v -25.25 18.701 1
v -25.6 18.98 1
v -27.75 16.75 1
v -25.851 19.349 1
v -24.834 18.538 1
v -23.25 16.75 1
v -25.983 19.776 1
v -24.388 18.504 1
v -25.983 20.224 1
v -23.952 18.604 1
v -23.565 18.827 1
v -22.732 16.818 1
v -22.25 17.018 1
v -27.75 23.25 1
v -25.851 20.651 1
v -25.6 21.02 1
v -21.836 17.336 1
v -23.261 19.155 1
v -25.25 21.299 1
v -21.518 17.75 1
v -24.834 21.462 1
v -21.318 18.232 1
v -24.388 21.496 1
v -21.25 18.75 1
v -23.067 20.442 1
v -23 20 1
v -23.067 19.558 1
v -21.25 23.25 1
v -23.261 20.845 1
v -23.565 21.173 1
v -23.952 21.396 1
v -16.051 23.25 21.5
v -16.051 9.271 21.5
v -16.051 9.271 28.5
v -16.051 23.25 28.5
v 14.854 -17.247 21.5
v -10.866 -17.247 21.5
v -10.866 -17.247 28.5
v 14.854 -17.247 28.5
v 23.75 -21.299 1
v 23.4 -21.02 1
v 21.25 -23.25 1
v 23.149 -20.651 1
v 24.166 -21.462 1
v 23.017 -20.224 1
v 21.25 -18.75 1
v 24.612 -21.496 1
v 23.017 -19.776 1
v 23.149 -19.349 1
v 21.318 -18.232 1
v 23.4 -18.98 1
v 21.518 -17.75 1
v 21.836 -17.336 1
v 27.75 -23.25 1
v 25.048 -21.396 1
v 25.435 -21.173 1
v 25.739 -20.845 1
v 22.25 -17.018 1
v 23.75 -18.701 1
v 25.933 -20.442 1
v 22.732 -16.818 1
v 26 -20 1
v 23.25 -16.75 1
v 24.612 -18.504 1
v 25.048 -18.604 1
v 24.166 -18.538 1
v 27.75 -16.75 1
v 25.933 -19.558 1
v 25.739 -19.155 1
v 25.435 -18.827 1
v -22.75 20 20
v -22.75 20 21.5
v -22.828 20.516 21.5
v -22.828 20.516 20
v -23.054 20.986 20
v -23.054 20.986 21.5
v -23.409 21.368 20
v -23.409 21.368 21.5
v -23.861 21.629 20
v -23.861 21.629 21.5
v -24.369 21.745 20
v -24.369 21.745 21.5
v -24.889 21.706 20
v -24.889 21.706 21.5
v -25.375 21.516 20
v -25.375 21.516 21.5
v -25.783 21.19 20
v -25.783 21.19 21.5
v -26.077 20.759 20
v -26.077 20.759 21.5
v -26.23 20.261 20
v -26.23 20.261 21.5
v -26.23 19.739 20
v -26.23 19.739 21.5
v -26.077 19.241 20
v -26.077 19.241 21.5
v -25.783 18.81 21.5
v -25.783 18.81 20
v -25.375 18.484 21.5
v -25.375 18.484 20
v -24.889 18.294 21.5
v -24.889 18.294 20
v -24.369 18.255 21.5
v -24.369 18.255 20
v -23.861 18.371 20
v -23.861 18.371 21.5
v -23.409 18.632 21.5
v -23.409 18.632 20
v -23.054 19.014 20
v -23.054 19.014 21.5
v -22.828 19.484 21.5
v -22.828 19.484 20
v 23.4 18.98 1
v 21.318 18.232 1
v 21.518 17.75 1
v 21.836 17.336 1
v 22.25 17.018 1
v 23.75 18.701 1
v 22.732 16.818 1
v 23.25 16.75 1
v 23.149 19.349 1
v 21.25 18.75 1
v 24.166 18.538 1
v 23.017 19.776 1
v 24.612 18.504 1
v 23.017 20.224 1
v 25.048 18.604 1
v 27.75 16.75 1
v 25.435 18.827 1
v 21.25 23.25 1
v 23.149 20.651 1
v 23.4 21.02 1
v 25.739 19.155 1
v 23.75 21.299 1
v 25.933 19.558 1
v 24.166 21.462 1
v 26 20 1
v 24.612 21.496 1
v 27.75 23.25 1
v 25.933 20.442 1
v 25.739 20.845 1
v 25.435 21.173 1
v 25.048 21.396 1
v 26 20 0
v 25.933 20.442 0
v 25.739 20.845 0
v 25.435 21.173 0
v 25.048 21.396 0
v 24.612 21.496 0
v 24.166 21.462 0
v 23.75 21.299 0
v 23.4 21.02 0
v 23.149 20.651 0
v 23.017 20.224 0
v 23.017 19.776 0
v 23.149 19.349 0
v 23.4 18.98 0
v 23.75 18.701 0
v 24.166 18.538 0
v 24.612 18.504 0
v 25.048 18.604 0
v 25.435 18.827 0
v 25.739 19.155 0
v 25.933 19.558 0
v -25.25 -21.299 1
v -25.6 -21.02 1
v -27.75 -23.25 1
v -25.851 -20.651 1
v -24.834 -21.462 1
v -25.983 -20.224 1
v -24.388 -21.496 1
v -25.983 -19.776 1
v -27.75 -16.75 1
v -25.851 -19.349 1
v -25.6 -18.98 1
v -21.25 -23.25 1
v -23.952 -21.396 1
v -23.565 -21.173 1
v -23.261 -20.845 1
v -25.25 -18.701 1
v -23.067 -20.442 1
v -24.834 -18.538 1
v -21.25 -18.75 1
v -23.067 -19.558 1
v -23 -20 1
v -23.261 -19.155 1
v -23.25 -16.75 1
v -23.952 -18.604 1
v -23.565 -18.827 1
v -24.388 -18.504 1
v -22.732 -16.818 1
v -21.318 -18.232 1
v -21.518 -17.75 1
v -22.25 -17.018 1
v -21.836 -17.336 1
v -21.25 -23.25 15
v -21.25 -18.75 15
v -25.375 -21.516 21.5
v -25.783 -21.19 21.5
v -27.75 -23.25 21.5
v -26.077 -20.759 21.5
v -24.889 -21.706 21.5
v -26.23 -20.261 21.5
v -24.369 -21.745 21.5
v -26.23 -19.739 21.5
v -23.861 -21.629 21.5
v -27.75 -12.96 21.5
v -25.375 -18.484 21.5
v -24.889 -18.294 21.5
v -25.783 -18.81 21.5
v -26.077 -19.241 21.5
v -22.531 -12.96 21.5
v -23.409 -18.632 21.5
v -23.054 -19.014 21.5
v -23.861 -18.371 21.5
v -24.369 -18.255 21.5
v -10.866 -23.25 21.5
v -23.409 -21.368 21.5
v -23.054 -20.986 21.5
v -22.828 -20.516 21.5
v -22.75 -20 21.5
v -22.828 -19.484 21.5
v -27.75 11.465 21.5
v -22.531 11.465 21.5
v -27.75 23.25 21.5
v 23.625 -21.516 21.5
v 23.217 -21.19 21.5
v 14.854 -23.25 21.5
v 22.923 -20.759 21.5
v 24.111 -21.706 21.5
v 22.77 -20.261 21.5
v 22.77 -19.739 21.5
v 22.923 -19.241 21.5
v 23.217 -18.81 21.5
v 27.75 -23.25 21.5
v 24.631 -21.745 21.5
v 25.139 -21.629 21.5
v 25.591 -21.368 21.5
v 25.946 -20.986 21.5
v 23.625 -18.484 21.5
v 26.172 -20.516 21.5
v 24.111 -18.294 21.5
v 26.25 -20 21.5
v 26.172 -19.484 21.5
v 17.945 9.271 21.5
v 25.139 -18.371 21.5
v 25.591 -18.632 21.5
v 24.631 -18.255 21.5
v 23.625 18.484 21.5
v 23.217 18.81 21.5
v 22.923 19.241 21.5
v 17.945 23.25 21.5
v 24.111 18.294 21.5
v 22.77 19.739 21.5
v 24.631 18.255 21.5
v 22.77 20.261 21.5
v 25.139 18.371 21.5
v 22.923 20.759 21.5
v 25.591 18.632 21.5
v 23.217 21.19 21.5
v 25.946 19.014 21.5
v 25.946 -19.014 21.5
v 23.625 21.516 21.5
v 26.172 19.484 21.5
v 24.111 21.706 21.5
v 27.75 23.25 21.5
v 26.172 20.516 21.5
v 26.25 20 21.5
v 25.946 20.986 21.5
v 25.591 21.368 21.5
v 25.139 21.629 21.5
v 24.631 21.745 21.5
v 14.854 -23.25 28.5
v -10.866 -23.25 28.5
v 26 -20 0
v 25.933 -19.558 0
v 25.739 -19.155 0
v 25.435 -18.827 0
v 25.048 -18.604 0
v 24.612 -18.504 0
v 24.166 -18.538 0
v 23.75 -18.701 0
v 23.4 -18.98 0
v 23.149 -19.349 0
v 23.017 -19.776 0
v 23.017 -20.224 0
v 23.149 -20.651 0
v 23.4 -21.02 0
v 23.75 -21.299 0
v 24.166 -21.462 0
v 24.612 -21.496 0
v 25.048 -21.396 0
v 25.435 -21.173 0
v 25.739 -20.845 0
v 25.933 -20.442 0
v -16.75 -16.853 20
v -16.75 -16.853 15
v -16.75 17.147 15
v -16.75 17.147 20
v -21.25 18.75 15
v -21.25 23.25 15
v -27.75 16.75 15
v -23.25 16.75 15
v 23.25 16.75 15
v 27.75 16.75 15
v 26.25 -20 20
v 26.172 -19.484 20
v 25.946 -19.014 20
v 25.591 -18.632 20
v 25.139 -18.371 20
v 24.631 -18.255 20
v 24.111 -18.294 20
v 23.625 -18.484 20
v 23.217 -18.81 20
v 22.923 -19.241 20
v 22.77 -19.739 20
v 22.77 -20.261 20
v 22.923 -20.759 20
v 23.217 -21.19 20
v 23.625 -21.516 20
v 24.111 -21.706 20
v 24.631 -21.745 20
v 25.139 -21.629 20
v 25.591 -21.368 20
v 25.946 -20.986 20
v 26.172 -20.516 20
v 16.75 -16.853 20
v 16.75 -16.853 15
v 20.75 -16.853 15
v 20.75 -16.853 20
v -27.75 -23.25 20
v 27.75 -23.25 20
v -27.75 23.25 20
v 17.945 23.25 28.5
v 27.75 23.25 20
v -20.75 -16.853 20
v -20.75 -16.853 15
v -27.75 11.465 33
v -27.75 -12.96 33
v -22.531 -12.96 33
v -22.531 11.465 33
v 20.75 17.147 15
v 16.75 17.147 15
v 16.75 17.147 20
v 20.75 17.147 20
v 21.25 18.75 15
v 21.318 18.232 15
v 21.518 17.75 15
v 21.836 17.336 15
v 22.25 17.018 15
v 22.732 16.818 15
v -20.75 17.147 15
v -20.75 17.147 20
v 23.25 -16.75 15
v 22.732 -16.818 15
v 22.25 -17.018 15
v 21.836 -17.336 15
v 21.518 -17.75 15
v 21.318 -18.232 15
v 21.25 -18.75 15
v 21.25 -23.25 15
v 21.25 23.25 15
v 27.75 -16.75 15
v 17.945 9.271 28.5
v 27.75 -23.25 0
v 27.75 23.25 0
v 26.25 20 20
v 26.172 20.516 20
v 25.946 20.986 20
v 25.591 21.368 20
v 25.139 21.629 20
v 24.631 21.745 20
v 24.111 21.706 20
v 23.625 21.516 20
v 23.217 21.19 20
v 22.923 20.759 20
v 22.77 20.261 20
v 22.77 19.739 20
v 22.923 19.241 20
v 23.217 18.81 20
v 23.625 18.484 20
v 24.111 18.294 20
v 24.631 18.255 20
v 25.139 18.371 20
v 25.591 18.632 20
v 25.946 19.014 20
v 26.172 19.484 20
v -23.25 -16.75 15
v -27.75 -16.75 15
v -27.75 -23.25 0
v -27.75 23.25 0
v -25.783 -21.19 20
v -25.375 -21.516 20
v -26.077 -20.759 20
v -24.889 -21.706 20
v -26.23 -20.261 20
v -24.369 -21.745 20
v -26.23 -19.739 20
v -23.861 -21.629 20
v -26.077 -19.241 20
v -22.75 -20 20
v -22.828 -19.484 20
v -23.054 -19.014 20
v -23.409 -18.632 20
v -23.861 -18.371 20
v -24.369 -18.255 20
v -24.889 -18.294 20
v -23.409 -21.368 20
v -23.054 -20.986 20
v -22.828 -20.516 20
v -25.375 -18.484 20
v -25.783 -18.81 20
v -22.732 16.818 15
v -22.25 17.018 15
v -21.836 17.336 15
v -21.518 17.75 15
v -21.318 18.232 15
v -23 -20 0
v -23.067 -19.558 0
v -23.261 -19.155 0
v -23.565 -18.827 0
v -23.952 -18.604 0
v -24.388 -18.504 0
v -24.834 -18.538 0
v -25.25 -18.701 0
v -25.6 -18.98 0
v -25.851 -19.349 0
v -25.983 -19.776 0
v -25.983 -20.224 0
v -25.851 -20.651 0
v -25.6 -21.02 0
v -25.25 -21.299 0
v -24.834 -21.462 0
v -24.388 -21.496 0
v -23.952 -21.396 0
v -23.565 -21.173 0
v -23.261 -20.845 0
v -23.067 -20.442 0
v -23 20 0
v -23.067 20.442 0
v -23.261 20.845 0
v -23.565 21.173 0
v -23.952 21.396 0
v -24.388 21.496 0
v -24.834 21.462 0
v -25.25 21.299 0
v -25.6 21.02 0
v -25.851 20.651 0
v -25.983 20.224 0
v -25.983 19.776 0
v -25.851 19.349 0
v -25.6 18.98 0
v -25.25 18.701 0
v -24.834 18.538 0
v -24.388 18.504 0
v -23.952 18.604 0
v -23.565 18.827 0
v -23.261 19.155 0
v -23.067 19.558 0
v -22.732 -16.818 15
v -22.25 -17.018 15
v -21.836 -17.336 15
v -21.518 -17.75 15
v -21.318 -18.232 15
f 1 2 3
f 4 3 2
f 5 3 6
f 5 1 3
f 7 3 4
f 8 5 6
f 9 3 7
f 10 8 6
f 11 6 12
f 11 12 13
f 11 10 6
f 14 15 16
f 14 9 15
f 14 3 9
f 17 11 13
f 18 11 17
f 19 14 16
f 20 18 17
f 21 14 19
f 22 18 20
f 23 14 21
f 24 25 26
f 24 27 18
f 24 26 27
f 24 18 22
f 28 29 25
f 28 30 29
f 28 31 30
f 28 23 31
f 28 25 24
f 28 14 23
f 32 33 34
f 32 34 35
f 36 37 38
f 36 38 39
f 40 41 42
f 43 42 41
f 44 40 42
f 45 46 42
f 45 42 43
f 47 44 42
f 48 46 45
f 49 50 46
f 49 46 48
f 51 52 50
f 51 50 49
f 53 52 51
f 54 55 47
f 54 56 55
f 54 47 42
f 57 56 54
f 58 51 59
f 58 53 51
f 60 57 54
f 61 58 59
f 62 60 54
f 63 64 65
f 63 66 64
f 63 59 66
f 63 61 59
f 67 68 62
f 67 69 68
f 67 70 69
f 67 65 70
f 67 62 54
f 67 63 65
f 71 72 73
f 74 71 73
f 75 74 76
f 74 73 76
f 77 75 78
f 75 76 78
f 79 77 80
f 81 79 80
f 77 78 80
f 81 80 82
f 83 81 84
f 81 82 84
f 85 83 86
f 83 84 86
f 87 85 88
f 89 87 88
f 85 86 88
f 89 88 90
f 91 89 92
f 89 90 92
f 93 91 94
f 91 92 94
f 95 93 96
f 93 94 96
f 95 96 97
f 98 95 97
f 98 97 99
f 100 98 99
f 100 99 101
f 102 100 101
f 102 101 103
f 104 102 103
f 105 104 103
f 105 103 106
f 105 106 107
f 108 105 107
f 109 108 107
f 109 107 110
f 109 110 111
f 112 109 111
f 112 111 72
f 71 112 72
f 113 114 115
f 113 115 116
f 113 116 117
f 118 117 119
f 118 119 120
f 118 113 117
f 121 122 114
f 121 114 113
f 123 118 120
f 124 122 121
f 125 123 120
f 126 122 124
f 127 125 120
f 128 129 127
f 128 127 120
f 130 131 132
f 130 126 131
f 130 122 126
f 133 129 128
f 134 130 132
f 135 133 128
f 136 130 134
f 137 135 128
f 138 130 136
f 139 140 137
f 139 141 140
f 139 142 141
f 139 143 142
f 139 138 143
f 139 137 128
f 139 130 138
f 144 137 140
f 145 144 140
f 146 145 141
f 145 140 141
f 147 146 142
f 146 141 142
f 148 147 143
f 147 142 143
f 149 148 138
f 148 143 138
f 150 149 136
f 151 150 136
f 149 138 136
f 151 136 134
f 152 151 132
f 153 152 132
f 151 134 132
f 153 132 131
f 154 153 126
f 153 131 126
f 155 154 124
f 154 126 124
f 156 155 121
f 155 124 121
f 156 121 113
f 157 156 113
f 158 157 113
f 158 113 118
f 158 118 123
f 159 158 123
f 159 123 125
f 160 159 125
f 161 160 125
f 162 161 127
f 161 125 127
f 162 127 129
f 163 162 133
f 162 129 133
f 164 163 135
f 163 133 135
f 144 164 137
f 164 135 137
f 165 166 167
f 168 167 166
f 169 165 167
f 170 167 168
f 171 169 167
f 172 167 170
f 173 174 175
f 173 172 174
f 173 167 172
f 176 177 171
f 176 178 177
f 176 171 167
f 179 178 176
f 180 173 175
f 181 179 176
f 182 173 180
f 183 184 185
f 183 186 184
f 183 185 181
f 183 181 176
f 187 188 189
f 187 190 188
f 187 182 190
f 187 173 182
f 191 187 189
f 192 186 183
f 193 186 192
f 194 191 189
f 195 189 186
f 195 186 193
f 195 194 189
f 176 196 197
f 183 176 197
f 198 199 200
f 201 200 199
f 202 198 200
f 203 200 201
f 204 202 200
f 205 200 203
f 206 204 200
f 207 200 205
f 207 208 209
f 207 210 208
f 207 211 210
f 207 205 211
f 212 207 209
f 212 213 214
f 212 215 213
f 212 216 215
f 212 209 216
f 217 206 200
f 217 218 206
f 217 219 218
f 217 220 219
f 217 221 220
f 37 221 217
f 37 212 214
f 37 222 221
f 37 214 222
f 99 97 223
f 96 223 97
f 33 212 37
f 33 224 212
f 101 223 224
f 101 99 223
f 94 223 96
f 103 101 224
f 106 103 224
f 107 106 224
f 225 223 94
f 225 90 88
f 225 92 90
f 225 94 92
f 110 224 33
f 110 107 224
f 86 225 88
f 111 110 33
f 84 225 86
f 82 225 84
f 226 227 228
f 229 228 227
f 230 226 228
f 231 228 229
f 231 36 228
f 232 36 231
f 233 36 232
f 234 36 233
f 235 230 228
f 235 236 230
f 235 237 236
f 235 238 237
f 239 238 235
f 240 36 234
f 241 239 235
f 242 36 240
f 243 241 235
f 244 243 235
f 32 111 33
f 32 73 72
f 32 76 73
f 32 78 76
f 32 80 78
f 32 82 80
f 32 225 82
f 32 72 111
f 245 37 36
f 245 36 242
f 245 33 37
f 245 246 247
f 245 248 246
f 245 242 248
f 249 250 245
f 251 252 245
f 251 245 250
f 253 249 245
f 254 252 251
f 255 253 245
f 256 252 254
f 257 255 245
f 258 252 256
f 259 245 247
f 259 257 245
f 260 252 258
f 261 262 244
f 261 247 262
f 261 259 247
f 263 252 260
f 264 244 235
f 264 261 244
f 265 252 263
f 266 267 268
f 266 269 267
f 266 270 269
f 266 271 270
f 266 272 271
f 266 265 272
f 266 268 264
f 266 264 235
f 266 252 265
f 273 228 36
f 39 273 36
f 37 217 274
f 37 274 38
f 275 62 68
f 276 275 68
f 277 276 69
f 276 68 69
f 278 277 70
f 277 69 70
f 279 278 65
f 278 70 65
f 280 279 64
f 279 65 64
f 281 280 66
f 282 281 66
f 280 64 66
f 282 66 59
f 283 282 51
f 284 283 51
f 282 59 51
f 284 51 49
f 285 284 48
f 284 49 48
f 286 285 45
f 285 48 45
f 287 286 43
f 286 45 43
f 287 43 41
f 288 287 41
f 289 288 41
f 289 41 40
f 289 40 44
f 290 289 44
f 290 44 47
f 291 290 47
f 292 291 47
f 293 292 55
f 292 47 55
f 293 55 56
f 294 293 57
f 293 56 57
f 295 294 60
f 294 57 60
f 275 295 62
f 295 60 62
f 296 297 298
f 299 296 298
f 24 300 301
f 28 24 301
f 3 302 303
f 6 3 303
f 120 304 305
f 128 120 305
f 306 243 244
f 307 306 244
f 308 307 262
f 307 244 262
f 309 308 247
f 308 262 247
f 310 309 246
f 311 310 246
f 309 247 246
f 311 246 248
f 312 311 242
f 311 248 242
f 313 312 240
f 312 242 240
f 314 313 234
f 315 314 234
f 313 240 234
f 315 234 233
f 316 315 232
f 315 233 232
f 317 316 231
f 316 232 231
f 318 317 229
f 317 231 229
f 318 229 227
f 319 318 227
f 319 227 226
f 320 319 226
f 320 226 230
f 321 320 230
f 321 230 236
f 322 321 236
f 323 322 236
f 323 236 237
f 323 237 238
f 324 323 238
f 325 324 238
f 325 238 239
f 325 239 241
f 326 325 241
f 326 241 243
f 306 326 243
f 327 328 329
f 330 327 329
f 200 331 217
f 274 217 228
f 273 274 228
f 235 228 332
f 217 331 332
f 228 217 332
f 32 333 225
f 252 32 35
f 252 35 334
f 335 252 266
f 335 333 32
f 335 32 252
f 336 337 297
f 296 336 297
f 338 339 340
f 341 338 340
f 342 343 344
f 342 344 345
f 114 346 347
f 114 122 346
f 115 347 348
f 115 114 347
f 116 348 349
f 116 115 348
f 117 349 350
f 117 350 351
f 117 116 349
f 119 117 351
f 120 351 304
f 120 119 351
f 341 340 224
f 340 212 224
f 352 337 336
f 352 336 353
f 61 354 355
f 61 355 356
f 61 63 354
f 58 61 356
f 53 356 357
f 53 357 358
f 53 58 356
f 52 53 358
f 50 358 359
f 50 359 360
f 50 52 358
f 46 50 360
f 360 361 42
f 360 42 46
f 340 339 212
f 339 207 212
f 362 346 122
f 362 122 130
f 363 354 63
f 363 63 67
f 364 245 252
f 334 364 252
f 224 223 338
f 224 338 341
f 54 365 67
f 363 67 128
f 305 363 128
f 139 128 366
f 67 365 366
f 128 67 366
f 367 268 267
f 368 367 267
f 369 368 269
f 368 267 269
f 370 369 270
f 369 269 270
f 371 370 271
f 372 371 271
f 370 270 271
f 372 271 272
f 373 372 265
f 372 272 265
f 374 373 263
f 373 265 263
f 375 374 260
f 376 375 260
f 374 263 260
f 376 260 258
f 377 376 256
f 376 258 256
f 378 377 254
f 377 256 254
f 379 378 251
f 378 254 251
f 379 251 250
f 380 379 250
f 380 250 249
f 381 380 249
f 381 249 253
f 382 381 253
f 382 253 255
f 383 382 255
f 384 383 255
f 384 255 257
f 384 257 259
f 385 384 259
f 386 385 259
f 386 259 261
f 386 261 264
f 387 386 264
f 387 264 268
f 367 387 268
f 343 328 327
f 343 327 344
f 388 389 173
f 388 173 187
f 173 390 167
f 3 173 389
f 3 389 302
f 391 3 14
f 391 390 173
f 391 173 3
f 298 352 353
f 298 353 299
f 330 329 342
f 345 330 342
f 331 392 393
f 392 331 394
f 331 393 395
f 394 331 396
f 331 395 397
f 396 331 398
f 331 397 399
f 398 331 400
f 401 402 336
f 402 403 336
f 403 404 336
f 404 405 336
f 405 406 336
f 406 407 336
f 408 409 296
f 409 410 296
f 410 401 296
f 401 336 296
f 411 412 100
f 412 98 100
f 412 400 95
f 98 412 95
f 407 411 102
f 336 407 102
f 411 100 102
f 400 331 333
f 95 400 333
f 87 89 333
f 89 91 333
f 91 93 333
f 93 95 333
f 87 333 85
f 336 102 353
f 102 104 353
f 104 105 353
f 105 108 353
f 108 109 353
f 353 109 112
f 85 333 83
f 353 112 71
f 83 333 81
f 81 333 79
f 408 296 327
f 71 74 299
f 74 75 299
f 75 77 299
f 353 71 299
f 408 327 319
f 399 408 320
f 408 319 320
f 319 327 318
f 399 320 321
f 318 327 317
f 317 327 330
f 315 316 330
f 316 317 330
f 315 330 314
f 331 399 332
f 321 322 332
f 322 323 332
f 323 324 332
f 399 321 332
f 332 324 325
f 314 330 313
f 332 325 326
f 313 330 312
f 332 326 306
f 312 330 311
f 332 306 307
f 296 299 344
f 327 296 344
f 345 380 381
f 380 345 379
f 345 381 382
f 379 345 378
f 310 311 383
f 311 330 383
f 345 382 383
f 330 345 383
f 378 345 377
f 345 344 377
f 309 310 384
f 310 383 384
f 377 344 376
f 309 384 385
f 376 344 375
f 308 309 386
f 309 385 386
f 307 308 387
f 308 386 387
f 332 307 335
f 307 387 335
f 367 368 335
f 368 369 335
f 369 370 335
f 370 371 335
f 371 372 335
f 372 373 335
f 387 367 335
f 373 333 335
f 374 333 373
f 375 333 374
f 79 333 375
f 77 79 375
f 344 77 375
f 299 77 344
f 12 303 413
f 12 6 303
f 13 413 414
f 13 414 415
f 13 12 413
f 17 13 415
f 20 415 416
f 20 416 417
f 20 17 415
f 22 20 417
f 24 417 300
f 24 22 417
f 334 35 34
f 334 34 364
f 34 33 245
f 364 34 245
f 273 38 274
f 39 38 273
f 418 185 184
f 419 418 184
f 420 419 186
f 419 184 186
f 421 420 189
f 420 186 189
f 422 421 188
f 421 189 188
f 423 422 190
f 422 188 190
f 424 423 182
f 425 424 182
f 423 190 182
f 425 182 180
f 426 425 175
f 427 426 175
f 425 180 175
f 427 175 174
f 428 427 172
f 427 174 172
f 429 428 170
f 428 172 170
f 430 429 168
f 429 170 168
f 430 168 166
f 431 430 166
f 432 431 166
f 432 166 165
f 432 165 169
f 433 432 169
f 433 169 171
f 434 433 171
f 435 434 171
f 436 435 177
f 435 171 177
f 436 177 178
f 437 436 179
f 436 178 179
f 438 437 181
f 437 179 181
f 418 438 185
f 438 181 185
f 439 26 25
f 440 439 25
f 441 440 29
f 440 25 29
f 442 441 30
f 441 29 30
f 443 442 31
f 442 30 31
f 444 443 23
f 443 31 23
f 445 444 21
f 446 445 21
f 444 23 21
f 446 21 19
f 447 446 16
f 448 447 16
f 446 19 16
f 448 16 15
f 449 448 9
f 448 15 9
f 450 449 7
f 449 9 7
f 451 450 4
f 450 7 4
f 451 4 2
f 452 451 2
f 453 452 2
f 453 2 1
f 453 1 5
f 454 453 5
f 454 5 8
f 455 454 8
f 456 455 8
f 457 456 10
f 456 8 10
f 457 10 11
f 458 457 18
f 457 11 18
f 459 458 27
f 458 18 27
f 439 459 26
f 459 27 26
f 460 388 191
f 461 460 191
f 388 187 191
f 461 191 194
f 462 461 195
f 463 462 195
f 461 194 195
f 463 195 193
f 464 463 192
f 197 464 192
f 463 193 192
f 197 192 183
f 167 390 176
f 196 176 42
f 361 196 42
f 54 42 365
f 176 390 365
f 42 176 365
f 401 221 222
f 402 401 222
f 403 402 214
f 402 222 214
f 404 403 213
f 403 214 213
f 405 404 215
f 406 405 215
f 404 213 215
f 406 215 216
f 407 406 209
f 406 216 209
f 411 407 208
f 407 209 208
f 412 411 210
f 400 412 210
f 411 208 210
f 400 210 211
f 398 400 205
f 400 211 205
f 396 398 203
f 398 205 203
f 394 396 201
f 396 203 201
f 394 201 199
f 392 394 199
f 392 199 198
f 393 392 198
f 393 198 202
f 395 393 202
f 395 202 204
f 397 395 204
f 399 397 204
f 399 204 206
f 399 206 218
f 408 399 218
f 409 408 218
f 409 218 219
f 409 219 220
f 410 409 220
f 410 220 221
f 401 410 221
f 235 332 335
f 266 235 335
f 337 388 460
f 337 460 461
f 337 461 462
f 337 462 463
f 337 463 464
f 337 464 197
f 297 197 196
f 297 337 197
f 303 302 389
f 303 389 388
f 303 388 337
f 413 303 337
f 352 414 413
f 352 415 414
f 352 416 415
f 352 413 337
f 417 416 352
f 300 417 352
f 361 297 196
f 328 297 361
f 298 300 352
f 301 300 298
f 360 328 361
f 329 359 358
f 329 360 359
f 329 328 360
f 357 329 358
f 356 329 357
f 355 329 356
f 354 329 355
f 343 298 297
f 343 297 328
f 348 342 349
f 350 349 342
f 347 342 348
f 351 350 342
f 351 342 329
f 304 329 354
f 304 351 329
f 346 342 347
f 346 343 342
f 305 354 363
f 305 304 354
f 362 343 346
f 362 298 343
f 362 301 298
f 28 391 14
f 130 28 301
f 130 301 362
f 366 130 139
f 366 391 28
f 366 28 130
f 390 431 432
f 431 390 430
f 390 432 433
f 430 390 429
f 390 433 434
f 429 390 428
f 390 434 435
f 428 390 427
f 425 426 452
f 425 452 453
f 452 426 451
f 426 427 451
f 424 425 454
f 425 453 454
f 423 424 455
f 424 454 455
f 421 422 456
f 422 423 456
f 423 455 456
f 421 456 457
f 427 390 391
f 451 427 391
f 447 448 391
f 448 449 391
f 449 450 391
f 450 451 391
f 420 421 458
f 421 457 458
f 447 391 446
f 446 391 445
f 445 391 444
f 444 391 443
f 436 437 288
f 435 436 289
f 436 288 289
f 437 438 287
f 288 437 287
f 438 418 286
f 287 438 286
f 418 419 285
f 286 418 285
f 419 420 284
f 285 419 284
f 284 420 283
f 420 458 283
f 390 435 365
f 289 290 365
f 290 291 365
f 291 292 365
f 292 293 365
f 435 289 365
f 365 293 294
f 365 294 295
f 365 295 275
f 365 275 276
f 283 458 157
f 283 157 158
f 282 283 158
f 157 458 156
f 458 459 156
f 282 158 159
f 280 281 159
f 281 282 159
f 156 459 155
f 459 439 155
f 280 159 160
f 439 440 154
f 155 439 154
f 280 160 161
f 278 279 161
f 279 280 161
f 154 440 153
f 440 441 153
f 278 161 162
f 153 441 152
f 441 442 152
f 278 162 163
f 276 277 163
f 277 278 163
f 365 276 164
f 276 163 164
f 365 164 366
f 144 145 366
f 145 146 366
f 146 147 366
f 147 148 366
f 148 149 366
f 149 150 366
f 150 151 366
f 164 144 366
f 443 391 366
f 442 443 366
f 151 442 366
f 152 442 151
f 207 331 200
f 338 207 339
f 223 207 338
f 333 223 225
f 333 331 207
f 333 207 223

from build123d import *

# Parameters (mm, degrees)
SKETCH_1_W          = 55.5
SKETCH_1_H          = 46.5
EXTRUDE_1_DEPTH     = 15
SKETCH_2_W          = 6.5
SKETCH_2_H          = 6.5
CUT_EXTRUDE_1_DEPTH = 14
FILLET_1_R          = 2
SKETCH_3_W          = 4
SKETCH_3_H          = 34
EXTRUDE_2_DEPTH     = 5
SKETCH_4_W          = 55.5
SKETCH_4_H          = 46.5
EXTRUDE_3_DEPTH     = 1.5
SKETCH_5_R          = 1.5
CUT_EXTRUDE_2_DEPTH = 1
SKETCH_6_R          = 1.75
CUT_EXTRUDE_3_DEPTH = 2
SKETCH_7_W          = 33.995169083
SKETCH_7_H          = 13.97859025
SKETCH_7_W_2        = 5.219477383
SKETCH_7_H_2        = 24.424681599
SKETCH_7_W_3        = 25.720685112
SKETCH_7_H_3        = 6.003184014
EXTRUDE_4_DEPTH     = 10
SKETCH_8_W          = 33.995169083
SKETCH_8_H          = 13.97859025
SKETCH_8_W_2        = 25.720685112
SKETCH_8_H_2        = 6.003184014
CUT_EXTRUDE_4_DEPTH = 3
SKETCH_10_W         = 5.219477383
SKETCH_10_H         = 24.424681599
EXTRUDE_6_DEPTH     = 1.5


with BuildPart() as part:
    # 草图1 → 凸台-拉伸1 (new body)
    with BuildSketch(Plane.XY):
        Rectangle(SKETCH_1_W, SKETCH_1_H)
    extrude(amount=EXTRUDE_1_DEPTH)

    # 草图2 → 切除-拉伸1 (cut)
    with BuildSketch(Plane.XY.offset(15)):
        with Locations((-24.5, 20)):
            Rectangle(SKETCH_2_W, SKETCH_2_H)
        with Locations((24.5, 20)):
            Rectangle(SKETCH_2_W, SKETCH_2_H)
        with Locations((24.5, -20)):
            Rectangle(SKETCH_2_W, SKETCH_2_H)
        with Locations((-24.5, -20)):
            Rectangle(SKETCH_2_W, SKETCH_2_H)
    extrude(amount=-CUT_EXTRUDE_1_DEPTH, mode=Mode.SUBTRACT)

    # 圆角1
    fillet_1_edges = [part.edges().sort_by_distance(p)[0] for p in [
        (-21.25, 16.75, 8),
        (21.25, 16.75, 8),
        (21.25, -16.75, 8),
        (-21.25, -16.75, 8),
    ]]
    fillet(fillet_1_edges, radius=FILLET_1_R)

    # 草图3 → 凸台-拉伸2 (add)
    with BuildSketch(Plane.XY.offset(15)):
        with Locations((-18.75, 0.147123408)):
            Rectangle(SKETCH_3_W, SKETCH_3_H)
        with Locations((18.75, 0.147123408)):
            Rectangle(SKETCH_3_W, SKETCH_3_H)
    extrude(amount=EXTRUDE_2_DEPTH)

    # 草图4 → 凸台-拉伸3 (add)
    with BuildSketch(Plane.XY.offset(20)):
        Rectangle(SKETCH_4_W, SKETCH_4_H)
    extrude(amount=EXTRUDE_3_DEPTH)

    # 草图5 → 切除-拉伸2 (cut)
    with BuildSketch(Plane.XY.offset(1)):
        with Locations((24.5, 20)):
            Circle(SKETCH_5_R)
        with Locations((-24.5, 20)):
            Circle(SKETCH_5_R)
        with Locations((-24.5, -20)):
            Circle(SKETCH_5_R)
        with Locations((24.5, -20)):
            Circle(SKETCH_5_R)
    extrude(amount=-CUT_EXTRUDE_2_DEPTH, mode=Mode.SUBTRACT)

    # 草图6 → 切除-拉伸3 (cut)
    with BuildSketch(Plane.XY.offset(21.5)):
        with Locations((-24.5, 20)):
            Circle(SKETCH_6_R)
        with Locations((24.5, 20)):
            Circle(SKETCH_6_R)
        with Locations((24.5, -20)):
            Circle(SKETCH_6_R)
        with Locations((-24.5, -20)):
            Circle(SKETCH_6_R)
    extrude(amount=-CUT_EXTRUDE_3_DEPTH, mode=Mode.SUBTRACT)

    # 草图7 → 凸台-拉伸4 (add)
    with BuildSketch(Plane.XY.offset(21.5)):
        with Locations((0.947079491, 16.260704875)):
            Rectangle(SKETCH_7_W, SKETCH_7_H)
        with Locations((-25.140261309, -0.747694334)):
            Rectangle(SKETCH_7_W_2, SKETCH_7_H_2)
        with Locations((1.993851559, -20.248407993)):
            Rectangle(SKETCH_7_W_3, SKETCH_7_H_3)
    extrude(amount=EXTRUDE_4_DEPTH)

    # 草图8 → 切除-拉伸4 (cut)
    with BuildSketch(Plane.XY.offset(31.5)):
        with Locations((0.947079491, 16.260704875)):
            Rectangle(SKETCH_8_W, SKETCH_8_H)
        with Locations((1.993851559, -20.248407993)):
            Rectangle(SKETCH_8_W_2, SKETCH_8_H_2)
    extrude(amount=-CUT_EXTRUDE_4_DEPTH, mode=Mode.SUBTRACT)

    # 草图10 → 凸台-拉伸6 (add)
    with BuildSketch(Plane.XY.offset(31.5)):
        with Locations((-25.140261309, -0.747694334)):
            Rectangle(SKETCH_10_W, SKETCH_10_H)
    extrude(amount=EXTRUDE_6_DEPTH)


solid = part.part
